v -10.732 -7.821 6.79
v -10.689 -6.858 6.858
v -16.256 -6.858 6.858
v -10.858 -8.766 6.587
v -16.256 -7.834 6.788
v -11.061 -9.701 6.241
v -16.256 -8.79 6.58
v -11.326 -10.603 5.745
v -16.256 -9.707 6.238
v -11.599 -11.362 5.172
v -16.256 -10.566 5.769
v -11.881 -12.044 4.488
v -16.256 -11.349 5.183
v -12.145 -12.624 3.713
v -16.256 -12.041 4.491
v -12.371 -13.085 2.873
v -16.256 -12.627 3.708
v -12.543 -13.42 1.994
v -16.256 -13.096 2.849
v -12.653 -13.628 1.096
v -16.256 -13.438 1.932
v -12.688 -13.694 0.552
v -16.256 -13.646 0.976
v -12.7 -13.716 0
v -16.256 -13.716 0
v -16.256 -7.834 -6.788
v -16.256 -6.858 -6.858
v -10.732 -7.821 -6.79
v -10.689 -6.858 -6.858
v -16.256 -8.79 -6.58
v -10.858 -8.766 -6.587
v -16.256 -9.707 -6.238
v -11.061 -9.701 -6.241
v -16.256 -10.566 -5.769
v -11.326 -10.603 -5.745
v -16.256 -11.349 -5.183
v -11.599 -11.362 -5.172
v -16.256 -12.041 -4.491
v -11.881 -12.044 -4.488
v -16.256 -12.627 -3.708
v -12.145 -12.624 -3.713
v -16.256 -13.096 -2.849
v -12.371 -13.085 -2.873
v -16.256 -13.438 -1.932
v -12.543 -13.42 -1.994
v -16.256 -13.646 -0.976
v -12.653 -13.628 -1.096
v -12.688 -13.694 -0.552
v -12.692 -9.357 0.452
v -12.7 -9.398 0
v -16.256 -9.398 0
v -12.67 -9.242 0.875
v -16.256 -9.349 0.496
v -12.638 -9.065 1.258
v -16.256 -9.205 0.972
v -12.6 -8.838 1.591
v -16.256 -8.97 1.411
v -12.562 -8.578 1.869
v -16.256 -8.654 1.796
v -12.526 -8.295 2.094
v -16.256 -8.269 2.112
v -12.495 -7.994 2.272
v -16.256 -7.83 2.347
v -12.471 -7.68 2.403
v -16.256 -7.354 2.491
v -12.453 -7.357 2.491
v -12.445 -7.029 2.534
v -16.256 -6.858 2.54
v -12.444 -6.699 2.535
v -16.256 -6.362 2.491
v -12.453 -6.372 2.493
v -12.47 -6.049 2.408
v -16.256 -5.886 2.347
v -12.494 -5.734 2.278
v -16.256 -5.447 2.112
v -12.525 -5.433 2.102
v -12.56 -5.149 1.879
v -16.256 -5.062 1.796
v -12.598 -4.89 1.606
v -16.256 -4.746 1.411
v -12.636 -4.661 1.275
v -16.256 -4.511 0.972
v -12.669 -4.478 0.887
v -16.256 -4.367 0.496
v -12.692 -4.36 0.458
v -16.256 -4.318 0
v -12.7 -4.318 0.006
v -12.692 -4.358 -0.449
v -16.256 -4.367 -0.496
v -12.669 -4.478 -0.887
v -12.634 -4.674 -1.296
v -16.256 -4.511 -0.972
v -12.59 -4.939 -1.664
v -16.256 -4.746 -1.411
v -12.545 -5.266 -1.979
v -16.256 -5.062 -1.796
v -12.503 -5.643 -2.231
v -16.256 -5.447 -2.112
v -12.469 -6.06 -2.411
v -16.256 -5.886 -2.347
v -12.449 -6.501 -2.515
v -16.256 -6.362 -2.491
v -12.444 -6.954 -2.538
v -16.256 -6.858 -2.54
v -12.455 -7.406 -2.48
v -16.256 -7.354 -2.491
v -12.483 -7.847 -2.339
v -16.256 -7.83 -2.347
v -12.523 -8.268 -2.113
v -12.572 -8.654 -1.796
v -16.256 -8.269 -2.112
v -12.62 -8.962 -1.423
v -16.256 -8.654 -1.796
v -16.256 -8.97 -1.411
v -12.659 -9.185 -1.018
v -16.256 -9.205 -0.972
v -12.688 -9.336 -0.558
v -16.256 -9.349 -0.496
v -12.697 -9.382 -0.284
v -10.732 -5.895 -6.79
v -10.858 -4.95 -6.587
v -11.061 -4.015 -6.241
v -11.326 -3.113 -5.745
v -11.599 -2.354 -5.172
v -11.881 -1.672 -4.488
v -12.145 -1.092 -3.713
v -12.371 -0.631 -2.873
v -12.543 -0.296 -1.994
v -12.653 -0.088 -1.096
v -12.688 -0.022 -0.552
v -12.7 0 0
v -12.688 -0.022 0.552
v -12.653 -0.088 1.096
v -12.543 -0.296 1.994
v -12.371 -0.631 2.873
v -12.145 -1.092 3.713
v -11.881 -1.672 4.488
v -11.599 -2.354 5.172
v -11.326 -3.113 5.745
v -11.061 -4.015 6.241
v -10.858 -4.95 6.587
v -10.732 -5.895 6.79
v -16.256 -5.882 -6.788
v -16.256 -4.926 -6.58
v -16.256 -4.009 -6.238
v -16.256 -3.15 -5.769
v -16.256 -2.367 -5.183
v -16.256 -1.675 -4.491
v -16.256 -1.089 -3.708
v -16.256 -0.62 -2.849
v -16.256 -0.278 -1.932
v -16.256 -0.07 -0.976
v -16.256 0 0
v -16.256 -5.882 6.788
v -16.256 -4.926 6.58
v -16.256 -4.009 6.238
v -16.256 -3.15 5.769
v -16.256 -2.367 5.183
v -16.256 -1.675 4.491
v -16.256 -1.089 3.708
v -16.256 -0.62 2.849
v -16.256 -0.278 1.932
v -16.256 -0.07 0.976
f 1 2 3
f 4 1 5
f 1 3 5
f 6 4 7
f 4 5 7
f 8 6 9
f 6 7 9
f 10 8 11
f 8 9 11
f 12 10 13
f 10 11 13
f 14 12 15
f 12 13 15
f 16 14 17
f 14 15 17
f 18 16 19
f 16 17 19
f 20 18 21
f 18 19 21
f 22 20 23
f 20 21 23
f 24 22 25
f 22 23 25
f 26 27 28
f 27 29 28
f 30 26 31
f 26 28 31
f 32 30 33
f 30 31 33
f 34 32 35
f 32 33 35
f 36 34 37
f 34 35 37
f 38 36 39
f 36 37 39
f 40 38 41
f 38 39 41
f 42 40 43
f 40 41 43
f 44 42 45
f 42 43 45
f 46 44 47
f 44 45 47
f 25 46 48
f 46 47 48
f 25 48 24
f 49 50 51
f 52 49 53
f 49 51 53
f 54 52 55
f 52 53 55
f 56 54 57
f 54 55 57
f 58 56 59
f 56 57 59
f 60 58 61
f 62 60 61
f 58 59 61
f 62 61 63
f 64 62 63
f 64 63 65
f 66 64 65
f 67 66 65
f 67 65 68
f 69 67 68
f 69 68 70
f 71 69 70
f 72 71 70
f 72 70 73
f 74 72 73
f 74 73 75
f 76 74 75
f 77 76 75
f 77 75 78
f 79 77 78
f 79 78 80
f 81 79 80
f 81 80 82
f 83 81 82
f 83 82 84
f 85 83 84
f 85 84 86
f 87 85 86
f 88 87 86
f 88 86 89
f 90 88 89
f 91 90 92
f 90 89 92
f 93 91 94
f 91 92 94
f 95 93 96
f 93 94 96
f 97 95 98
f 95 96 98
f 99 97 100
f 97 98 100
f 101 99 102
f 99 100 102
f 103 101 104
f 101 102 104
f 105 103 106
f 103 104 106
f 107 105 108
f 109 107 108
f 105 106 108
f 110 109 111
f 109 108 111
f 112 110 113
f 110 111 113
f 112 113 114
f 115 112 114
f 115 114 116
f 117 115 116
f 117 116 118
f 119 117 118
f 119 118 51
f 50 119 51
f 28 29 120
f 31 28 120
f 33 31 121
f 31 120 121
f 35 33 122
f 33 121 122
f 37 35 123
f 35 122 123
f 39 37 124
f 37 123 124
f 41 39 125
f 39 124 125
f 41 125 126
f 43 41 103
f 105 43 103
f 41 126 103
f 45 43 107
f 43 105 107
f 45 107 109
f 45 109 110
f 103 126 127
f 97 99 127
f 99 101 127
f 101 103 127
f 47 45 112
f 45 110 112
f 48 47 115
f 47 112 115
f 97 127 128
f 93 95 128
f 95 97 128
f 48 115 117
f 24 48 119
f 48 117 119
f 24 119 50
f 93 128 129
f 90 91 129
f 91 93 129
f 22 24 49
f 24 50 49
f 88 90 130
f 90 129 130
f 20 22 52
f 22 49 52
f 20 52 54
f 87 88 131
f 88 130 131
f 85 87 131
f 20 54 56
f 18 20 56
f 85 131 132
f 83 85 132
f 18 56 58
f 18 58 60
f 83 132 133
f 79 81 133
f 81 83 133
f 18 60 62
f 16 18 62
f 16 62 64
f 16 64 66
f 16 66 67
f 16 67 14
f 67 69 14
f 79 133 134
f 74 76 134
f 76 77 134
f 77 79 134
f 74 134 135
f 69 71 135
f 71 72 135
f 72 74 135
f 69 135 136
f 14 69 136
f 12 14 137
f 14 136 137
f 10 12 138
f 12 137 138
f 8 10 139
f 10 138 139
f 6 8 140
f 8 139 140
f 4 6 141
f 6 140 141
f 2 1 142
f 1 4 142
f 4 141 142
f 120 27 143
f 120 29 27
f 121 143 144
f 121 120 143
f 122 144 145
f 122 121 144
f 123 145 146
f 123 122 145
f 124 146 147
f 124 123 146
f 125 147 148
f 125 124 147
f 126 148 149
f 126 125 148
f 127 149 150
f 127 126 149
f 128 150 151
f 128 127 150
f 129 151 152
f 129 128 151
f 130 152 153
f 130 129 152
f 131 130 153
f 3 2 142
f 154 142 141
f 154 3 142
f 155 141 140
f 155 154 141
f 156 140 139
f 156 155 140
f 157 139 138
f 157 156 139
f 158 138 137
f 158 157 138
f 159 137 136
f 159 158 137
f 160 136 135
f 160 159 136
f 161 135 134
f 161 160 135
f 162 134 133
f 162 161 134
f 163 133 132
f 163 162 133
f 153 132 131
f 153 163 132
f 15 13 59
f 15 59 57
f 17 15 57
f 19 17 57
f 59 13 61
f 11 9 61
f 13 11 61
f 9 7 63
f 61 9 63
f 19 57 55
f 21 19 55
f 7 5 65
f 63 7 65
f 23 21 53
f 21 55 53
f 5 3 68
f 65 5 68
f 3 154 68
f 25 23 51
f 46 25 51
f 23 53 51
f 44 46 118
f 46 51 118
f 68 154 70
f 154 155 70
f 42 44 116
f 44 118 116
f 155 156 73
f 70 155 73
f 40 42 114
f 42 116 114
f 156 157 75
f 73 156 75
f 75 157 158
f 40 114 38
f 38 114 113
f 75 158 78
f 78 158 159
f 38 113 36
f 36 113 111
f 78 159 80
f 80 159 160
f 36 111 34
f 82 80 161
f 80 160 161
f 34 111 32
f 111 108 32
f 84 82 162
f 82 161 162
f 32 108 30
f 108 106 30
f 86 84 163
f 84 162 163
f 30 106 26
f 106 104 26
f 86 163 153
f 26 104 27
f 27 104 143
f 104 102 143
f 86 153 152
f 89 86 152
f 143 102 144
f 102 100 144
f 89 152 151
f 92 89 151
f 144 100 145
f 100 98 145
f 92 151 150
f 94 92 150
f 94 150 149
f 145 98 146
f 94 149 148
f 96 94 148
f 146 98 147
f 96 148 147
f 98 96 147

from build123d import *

# Parameters (mm, degrees)
F1_DEPTH = 13.716
F2_R     = 6.8579
F3_R     = 2.54
F4_DEPTH = 5.5678543904


# Not quite as in the source:
# - a fillet or chamfer is up to 0.001 mm smaller than in the source, because OpenCascade refuses the exact size


with BuildPart() as f1:
    # F0 (on Front) → F1 (new body)
    with BuildSketch(Plane.XZ):
        with BuildLine():
            ThreePointArc((-10.6891457096, -6.858), (-12.7, 0), (-10.6891457096, 6.858))
            Line((-10.6891457096, 6.858), (-16.256, 6.858))
            Line((-16.256, 6.858), (-16.256, 0))
            Line((-16.256, 0), (-16.256, -6.858))
            Line((-16.256, -6.858), (-10.6891457096, -6.858))
        make_face()
    extrude(amount=F1_DEPTH)

    # F2 (radius 6.858 in the source; OpenCascade refuses exactly that, so slightly less here)
    f2_edges = [f1.edges().sort_by_distance(p)[0] for p in [
        (-13.472573, 0, 6.858),
        (-13.472573, -13.716, 6.858),
        (-13.472573, -13.716, -6.858),
        (-13.472573, 0, -6.858),
    ]]
    fillet(f2_edges, radius=F2_R)

    # F3 (on face) → F4 (cut, through all)
    with BuildSketch(Plane(origin=(-16.256, 0, 0), x_dir=(0, -1, 0), z_dir=(-1, 0, 0))):
        with Locations((6.858, 0)):
            Circle(F3_R)
    extrude(amount=-F4_DEPTH, mode=Mode.SUBTRACT)


solid = f1.part
